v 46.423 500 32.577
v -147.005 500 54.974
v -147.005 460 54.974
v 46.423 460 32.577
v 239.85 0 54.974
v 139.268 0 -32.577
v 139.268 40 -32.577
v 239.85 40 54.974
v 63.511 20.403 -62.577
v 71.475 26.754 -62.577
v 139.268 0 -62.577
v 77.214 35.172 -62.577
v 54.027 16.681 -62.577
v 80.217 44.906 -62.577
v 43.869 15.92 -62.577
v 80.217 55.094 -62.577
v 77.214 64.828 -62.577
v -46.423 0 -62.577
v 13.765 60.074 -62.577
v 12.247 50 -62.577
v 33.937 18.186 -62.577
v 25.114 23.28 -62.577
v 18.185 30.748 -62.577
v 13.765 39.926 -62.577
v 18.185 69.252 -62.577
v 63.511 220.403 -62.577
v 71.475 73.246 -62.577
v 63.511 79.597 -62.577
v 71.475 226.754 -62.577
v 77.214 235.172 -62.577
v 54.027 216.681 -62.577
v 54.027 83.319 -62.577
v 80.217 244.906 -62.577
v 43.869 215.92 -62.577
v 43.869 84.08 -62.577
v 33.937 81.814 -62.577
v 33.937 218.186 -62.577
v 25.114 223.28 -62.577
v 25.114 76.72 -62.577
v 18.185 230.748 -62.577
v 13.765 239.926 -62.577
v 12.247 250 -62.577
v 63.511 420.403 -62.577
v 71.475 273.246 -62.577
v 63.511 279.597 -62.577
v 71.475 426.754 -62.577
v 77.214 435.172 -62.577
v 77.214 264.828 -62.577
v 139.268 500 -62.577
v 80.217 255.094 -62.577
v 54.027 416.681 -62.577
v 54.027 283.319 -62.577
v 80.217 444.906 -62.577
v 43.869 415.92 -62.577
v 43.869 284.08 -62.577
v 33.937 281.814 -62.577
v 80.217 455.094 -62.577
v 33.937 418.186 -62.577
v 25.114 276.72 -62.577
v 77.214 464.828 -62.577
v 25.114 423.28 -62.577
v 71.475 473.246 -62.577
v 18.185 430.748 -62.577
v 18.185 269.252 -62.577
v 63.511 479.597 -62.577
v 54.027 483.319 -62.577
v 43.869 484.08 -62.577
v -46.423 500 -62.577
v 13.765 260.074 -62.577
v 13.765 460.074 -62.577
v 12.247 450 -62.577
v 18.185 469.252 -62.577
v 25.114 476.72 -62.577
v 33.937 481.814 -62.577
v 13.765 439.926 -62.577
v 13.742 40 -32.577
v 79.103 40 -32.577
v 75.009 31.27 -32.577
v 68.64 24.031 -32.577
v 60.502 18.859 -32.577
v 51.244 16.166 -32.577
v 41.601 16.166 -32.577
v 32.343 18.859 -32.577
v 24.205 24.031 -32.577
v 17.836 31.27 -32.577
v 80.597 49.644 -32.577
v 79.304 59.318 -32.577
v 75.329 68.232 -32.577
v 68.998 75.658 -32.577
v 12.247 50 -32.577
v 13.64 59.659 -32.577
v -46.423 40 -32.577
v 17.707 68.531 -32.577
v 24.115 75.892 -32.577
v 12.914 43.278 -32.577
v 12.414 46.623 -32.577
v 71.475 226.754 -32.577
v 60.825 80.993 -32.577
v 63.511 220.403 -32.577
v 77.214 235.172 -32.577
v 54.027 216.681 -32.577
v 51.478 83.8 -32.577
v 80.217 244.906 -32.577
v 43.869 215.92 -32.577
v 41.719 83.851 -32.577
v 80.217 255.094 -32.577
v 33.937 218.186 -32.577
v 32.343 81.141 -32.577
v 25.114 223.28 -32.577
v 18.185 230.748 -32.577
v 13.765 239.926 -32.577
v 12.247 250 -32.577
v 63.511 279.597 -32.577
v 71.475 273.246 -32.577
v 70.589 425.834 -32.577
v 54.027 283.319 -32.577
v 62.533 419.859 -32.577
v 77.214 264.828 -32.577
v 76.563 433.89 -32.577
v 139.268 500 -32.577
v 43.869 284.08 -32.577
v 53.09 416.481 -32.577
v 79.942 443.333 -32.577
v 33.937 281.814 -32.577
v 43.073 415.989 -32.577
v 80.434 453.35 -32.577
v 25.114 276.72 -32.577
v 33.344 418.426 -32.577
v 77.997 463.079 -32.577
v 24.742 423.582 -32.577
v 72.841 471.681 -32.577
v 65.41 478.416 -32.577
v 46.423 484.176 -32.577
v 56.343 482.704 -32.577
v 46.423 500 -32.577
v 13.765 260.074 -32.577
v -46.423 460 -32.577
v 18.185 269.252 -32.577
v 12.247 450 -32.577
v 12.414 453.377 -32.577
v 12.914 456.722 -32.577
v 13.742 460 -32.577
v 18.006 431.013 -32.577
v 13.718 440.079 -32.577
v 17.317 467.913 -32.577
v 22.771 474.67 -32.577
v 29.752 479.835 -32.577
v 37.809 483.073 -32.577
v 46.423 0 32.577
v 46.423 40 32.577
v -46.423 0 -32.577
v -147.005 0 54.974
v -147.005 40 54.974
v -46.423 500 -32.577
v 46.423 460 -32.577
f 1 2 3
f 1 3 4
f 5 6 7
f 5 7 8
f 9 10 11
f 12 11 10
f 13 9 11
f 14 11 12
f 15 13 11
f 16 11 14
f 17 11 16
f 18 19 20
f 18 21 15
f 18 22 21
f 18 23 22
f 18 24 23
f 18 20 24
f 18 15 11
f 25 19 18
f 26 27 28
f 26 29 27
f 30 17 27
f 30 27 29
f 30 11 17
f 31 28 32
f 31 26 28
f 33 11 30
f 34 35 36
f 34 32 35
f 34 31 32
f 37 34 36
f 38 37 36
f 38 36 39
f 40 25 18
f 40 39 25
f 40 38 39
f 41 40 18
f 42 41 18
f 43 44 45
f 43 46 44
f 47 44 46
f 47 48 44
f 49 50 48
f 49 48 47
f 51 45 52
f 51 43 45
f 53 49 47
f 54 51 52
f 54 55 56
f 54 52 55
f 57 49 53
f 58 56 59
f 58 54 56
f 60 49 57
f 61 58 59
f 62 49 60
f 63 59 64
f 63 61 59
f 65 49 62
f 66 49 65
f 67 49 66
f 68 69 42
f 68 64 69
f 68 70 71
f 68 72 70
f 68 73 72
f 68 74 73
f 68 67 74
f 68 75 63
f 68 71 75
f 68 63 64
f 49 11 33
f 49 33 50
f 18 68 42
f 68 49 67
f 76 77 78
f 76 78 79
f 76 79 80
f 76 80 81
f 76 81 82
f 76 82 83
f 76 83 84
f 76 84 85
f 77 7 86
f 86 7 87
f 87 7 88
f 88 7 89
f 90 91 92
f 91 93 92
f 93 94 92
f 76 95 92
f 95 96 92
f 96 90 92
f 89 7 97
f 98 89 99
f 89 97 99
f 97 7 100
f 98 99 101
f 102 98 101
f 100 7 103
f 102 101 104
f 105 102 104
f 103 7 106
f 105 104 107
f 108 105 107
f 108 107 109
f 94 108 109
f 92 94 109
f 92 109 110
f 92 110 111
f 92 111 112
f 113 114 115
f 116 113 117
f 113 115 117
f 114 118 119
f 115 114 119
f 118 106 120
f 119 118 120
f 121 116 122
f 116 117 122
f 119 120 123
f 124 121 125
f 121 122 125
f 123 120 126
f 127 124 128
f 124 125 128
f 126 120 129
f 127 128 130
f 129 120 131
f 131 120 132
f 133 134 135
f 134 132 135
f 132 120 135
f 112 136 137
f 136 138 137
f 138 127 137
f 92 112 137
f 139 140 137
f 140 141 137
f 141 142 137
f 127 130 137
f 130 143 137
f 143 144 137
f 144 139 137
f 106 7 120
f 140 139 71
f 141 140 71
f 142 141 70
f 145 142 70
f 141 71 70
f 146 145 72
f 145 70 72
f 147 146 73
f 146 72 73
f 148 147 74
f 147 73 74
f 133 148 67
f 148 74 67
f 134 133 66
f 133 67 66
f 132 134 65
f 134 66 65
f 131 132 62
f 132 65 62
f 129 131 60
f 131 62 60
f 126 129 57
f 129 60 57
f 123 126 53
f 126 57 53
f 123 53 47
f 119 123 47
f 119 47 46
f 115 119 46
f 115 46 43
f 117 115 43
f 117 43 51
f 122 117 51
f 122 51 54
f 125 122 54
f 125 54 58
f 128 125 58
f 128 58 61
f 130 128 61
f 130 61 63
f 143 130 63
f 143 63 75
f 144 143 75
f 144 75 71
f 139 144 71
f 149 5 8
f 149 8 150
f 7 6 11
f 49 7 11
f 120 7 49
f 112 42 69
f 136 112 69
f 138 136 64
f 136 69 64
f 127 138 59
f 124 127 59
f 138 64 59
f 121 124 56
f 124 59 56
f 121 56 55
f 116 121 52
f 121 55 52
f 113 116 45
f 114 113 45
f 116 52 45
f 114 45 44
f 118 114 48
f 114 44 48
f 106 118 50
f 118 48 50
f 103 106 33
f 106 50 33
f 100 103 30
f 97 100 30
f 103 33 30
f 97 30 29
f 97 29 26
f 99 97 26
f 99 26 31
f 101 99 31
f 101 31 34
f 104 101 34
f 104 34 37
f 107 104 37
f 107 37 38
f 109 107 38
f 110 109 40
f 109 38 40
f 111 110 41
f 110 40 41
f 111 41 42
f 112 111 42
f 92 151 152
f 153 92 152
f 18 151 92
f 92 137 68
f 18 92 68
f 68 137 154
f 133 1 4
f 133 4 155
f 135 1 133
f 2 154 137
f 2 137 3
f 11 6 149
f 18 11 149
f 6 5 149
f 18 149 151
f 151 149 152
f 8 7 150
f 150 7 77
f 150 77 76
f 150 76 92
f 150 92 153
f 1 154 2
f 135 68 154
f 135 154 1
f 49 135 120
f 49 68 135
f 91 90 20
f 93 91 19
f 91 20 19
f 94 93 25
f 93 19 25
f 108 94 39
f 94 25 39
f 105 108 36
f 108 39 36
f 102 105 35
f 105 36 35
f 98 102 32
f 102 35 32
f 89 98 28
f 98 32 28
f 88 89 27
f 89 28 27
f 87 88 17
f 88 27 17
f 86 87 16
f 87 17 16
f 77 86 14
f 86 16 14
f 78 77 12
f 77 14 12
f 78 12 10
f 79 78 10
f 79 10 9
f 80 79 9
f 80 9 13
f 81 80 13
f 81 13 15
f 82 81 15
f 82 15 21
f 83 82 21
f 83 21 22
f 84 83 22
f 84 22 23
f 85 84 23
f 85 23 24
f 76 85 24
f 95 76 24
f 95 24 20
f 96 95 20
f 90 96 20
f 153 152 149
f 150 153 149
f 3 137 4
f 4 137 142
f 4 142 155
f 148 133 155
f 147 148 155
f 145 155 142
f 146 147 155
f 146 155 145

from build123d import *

# Parameters (mm, degrees)
BOSS_EXTRUDE1_DEPTH = 40
SKETCH3_W           = 185.690324397
SKETCH3_H           = 500
BOSS_EXTRUDE2_DEPTH = 30
SKETCH4_R           = 34.175984335
CUT_EXTRUDE1_DEPTH  = 30
LPATTERN1_COUNT     = 2
LPATTERN1_PITCH     = 200
LPATTERN1_COL_COUNT = 2
LPATTERN1_COL_PITCH = 200


with BuildPart() as part:
    # Sketch1 → Boss-Extrude1 (new body)
    with BuildSketch(Plane(origin=(0, 0, 0), x_dir=(1, 0, 0), z_dir=(0, 1, 0))):
        Polygon((-46.422581099, 32.577249894), (-147.004840148, -54.974109197), (46.422581099, -32.577249894), (46.422581099, 32.577249894), align=None)
    boss_extrude1 = extrude(amount=BOSS_EXTRUDE1_DEPTH)

    # Mirror1: Boss-Extrude1 across plane
    add(boss_extrude1.mirror(Plane(origin=(46.422581099, 40, -32.577249894), x_dir=(0, 0, 1), z_dir=(-1, 0, 0))))

    # Sketch3 → Boss-Extrude2 (add)
    with BuildSketch(Plane(origin=(0, 0, -32.577249894), x_dir=(-1, 0, 0), z_dir=(0, 0, -1))):
        with Locations((-46.422581099, 250)):
            Rectangle(SKETCH3_W, SKETCH3_H)
    extrude(amount=BOSS_EXTRUDE2_DEPTH)

    # Mirror5: Boss-Extrude1 across plane
    add(boss_extrude1.mirror(Plane.ZX.offset(250)))

    # Sketch4 → Cut-Extrude1 (cut)
    with BuildSketch(Plane(origin=(0, 0, -62.577249894), x_dir=(-1, 0, 0), z_dir=(0, 0, -1))):
        with Locations((-46.422581099, 250)):
            Circle(SKETCH4_R)
    cut_extrude1 = extrude(amount=-CUT_EXTRUDE1_DEPTH, mode=Mode.SUBTRACT)

    # LPattern1: Cut-Extrude1 ×2
    with Locations(*[(0, i * LPATTERN1_PITCH, 0) for i in range(1, LPATTERN1_COUNT)]):
        add(cut_extrude1, mode=Mode.SUBTRACT)

    # LPattern1 col: Cut-Extrude1 ×2
    with Locations(*[(0, -i * LPATTERN1_COL_PITCH, 0) for i in range(1, LPATTERN1_COL_COUNT)]):
        add(cut_extrude1, mode=Mode.SUBTRACT)


solid = part.part
